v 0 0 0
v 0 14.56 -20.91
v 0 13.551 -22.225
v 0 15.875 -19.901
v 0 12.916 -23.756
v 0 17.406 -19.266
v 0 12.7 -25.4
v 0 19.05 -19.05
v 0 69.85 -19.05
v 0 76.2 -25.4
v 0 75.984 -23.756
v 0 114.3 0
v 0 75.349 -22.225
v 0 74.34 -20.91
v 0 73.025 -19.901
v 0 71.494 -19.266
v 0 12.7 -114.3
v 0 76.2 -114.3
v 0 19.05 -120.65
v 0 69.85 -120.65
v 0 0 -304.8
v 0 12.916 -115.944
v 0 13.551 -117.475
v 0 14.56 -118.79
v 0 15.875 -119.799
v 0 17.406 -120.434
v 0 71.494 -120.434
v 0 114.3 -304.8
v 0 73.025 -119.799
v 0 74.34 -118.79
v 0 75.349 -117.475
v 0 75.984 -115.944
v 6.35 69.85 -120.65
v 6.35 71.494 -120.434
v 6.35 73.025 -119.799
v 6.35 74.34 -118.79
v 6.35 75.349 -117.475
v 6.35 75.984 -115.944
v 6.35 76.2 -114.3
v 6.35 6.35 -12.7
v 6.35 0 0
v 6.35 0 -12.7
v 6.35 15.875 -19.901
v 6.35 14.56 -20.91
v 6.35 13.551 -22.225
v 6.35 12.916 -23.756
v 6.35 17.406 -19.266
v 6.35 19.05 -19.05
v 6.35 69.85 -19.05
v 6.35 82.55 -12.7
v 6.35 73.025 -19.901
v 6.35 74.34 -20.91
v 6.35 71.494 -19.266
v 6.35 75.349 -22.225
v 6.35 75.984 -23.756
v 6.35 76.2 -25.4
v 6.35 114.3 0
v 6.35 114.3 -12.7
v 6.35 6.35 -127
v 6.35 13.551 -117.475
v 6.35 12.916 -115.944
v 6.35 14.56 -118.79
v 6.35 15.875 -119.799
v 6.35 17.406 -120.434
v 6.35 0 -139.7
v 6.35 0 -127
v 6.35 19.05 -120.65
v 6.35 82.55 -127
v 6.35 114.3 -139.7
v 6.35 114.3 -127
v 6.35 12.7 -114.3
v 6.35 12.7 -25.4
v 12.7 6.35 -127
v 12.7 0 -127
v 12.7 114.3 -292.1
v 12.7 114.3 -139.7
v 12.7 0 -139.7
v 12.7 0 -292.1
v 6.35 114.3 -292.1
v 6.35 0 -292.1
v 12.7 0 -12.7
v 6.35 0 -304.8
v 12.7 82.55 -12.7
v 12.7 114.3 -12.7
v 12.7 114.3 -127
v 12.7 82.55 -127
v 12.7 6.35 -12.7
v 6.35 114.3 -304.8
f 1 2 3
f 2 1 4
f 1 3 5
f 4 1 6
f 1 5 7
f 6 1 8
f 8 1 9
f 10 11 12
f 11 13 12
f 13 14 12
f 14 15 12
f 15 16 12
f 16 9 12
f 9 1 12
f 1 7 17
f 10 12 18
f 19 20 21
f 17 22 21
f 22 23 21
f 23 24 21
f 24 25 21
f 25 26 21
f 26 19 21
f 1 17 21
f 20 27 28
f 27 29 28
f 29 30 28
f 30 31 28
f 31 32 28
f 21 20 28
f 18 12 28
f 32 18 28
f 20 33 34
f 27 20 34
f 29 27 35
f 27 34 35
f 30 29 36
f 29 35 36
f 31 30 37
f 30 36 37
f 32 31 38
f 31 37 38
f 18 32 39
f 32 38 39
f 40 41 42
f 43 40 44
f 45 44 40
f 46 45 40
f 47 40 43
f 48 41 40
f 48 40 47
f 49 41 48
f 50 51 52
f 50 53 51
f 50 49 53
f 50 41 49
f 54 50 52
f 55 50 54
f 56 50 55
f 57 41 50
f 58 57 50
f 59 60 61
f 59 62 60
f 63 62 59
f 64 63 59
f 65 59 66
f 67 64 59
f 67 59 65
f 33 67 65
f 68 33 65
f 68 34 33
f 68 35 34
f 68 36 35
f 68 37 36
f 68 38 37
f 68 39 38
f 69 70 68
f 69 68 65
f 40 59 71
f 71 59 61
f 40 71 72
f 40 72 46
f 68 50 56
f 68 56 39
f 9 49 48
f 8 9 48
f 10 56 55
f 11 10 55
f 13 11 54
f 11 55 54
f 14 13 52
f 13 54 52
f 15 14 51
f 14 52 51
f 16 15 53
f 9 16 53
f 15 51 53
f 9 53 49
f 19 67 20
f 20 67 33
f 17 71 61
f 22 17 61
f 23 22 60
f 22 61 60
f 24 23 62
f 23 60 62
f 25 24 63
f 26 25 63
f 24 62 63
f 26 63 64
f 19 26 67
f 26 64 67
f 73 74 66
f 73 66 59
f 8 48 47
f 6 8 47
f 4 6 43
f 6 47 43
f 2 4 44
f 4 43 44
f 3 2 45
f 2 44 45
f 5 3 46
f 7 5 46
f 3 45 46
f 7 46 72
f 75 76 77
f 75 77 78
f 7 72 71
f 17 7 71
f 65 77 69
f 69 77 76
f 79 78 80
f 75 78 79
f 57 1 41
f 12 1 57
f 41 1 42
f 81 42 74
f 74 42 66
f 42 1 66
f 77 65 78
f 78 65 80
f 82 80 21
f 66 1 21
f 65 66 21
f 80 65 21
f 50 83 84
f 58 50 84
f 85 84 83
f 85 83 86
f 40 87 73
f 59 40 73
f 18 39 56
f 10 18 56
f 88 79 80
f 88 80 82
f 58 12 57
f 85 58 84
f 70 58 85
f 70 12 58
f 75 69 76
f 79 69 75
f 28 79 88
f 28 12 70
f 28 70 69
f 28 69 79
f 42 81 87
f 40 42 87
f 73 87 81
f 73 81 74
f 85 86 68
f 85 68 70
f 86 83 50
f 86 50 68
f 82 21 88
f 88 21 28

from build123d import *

# Parameters (mm, degrees)
SKETCH1_W           = 304.8
SKETCH1_H           = 114.3
BOSS_EXTRUDE1_DEPTH = 12.7
SKETCH2_W           = 12.7
SKETCH2_H           = 114.3
CUT_EXTRUDE1_DEPTH  = 6.35
SKETCH3_W           = 114.3
SKETCH3_H           = 76.2
CUT_EXTRUDE2_DEPTH  = 6.35
CUT_EXTRUDE3_DEPTH  = 326.58847108


with BuildPart() as part:
    # Sketch1 → Boss-Extrude1 (new body)
    with BuildSketch(Plane(origin=(0, 0, 0), x_dir=(0, 0, -1), z_dir=(1, 0, 0))):
        with Locations((152.4, 57.15)):
            Rectangle(SKETCH1_W, SKETCH1_H)
    extrude(amount=BOSS_EXTRUDE1_DEPTH)

    # Sketch2 → Cut-Extrude1 (cut)
    with BuildSketch(Plane(origin=(12.7, 0, 0), x_dir=(0, 0, -1), z_dir=(1, 0, 0))):
        with Locations((6.35, 57.15)):
            Rectangle(SKETCH2_W, SKETCH2_H)
        with Locations((298.45, 57.15)):
            Rectangle(SKETCH2_W, SKETCH2_H)
        with Locations((133.35, 57.15)):
            Rectangle(SKETCH2_W, SKETCH2_H)
    extrude(amount=-CUT_EXTRUDE1_DEPTH, mode=Mode.SUBTRACT)

    # Sketch3 → Cut-Extrude2 (cut)
    with BuildSketch(Plane(origin=(12.7, 0, 0), x_dir=(0, 0, -1), z_dir=(1, 0, 0))):
        with Locations((69.85, 44.45)):
            Rectangle(SKETCH3_W, SKETCH3_H)
    extrude(amount=-CUT_EXTRUDE2_DEPTH, mode=Mode.SUBTRACT)

    # Sketch4 → Cut-Extrude3 (cut, through all)
    with BuildSketch(Plane(origin=(6.35, 0, 0), x_dir=(0, 0, -1), z_dir=(1, 0, 0))):
        with BuildLine():
            Line((19.05, 69.85), (19.05, 19.05))
            ThreePointArc((19.05, 19.05), (20.909871939, 14.559871939), (25.4, 12.7))
            Line((25.4, 12.7), (114.3, 12.7))
            ThreePointArc((114.3, 12.7), (118.790128061, 14.559871939), (120.65, 19.05))
            Line((120.65, 19.05), (120.65, 69.85))
            ThreePointArc((120.65, 69.85), (118.790128061, 74.340128061), (114.3, 76.2))
            Line((114.3, 76.2), (25.4, 76.2))
            ThreePointArc((25.4, 76.2), (20.909871939, 74.340128061), (19.05, 69.85))
        make_face()
    extrude(amount=-CUT_EXTRUDE3_DEPTH, mode=Mode.SUBTRACT)


solid = part.part
